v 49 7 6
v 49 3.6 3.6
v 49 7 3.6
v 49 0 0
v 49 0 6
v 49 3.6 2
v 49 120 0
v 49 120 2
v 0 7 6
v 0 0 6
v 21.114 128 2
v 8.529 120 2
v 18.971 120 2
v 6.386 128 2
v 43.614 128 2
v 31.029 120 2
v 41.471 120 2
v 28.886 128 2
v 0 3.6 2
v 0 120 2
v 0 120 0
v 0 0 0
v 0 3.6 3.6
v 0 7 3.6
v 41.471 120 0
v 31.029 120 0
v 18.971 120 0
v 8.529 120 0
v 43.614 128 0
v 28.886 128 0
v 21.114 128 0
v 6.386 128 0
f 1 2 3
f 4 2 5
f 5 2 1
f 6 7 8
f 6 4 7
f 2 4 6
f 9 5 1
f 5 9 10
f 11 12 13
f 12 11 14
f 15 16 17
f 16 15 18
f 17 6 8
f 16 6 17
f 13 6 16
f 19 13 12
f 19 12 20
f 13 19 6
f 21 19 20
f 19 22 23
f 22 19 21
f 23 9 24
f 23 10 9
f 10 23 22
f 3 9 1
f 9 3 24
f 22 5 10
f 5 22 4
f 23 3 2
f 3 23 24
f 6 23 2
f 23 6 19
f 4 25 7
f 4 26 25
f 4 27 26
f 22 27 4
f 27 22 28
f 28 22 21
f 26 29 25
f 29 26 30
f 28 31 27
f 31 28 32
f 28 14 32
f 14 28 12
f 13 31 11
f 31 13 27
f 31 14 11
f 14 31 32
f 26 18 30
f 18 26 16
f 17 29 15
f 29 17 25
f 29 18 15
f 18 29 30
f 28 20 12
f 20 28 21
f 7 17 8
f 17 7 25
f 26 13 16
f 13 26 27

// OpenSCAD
$fa = 1;
$fs = 0.1;

panel_height = 45;
panel_length = 120;
panel_depth = 2;

wall_thickness = 2;

// 21.5 gap
// 18.5 / 2

module tray () {
    cube([
        panel_height + (wall_thickness * 2),
        panel_length,
        panel_depth
    ]);
}

module _wedge () {
    rotate([0, 0, 15])
        cube([10, 10, wall_thickness], center=true);

    translate([-2.5, 0, 0])
        rotate([0, 0, -15])
        cube([10, 10, wall_thickness], center=true);
}

module wedge () {
    difference() {
        _wedge();

        translate([0, -6, 0])
            cube([20, 5, wall_thickness + 0.002], center=true);

        translate([0, 7.25, 0])
            cube([20, 5, wall_thickness + 0.002], center=true);
    }
}


//difference() {
//    tray();

//    translate([12.5, 4.5, (wall_thickness / 2) - 0.001])
//        rotate([0, 0, 180])
//        scale([1.05, 1.05, 1.1])
//        wedge();

//    translate([35, 4.5, (wall_thickness / 2) - 0.001])
//        rotate([0, 0, 180])
//        scale([1, 1, 1.1])
//        wedge();

//    translate([((panel_height + (wall_thickness * 2)) / 2) - (21.5/2), panel_length - 20, 0])
//        cylinder(r=3.3/2, h=10, center=true);
//    translate([((panel_height + (wall_thickness * 2)) / 2) + (21.5/2), panel_length - 20, 0])
//        cylinder(r=3.3/2, h=10, center=true);
//}

tray();

difference() {
    translate([0, 0, panel_depth])
        cube([panel_height + (wall_thickness * 2), 7, 4]);

    translate([-0.001, 3.6, panel_depth])
        cube([panel_height + (wall_thickness * 2) + 0.002, 4.002, 1.6]);
}

translate([12.5, panel_length + 4.5, wall_thickness / 2])
    rotate([0, 0, 180])
    wedge();

translate([35, panel_length + 4.5, wall_thickness / 2])
    rotate([0, 0, 180])
    wedge();
